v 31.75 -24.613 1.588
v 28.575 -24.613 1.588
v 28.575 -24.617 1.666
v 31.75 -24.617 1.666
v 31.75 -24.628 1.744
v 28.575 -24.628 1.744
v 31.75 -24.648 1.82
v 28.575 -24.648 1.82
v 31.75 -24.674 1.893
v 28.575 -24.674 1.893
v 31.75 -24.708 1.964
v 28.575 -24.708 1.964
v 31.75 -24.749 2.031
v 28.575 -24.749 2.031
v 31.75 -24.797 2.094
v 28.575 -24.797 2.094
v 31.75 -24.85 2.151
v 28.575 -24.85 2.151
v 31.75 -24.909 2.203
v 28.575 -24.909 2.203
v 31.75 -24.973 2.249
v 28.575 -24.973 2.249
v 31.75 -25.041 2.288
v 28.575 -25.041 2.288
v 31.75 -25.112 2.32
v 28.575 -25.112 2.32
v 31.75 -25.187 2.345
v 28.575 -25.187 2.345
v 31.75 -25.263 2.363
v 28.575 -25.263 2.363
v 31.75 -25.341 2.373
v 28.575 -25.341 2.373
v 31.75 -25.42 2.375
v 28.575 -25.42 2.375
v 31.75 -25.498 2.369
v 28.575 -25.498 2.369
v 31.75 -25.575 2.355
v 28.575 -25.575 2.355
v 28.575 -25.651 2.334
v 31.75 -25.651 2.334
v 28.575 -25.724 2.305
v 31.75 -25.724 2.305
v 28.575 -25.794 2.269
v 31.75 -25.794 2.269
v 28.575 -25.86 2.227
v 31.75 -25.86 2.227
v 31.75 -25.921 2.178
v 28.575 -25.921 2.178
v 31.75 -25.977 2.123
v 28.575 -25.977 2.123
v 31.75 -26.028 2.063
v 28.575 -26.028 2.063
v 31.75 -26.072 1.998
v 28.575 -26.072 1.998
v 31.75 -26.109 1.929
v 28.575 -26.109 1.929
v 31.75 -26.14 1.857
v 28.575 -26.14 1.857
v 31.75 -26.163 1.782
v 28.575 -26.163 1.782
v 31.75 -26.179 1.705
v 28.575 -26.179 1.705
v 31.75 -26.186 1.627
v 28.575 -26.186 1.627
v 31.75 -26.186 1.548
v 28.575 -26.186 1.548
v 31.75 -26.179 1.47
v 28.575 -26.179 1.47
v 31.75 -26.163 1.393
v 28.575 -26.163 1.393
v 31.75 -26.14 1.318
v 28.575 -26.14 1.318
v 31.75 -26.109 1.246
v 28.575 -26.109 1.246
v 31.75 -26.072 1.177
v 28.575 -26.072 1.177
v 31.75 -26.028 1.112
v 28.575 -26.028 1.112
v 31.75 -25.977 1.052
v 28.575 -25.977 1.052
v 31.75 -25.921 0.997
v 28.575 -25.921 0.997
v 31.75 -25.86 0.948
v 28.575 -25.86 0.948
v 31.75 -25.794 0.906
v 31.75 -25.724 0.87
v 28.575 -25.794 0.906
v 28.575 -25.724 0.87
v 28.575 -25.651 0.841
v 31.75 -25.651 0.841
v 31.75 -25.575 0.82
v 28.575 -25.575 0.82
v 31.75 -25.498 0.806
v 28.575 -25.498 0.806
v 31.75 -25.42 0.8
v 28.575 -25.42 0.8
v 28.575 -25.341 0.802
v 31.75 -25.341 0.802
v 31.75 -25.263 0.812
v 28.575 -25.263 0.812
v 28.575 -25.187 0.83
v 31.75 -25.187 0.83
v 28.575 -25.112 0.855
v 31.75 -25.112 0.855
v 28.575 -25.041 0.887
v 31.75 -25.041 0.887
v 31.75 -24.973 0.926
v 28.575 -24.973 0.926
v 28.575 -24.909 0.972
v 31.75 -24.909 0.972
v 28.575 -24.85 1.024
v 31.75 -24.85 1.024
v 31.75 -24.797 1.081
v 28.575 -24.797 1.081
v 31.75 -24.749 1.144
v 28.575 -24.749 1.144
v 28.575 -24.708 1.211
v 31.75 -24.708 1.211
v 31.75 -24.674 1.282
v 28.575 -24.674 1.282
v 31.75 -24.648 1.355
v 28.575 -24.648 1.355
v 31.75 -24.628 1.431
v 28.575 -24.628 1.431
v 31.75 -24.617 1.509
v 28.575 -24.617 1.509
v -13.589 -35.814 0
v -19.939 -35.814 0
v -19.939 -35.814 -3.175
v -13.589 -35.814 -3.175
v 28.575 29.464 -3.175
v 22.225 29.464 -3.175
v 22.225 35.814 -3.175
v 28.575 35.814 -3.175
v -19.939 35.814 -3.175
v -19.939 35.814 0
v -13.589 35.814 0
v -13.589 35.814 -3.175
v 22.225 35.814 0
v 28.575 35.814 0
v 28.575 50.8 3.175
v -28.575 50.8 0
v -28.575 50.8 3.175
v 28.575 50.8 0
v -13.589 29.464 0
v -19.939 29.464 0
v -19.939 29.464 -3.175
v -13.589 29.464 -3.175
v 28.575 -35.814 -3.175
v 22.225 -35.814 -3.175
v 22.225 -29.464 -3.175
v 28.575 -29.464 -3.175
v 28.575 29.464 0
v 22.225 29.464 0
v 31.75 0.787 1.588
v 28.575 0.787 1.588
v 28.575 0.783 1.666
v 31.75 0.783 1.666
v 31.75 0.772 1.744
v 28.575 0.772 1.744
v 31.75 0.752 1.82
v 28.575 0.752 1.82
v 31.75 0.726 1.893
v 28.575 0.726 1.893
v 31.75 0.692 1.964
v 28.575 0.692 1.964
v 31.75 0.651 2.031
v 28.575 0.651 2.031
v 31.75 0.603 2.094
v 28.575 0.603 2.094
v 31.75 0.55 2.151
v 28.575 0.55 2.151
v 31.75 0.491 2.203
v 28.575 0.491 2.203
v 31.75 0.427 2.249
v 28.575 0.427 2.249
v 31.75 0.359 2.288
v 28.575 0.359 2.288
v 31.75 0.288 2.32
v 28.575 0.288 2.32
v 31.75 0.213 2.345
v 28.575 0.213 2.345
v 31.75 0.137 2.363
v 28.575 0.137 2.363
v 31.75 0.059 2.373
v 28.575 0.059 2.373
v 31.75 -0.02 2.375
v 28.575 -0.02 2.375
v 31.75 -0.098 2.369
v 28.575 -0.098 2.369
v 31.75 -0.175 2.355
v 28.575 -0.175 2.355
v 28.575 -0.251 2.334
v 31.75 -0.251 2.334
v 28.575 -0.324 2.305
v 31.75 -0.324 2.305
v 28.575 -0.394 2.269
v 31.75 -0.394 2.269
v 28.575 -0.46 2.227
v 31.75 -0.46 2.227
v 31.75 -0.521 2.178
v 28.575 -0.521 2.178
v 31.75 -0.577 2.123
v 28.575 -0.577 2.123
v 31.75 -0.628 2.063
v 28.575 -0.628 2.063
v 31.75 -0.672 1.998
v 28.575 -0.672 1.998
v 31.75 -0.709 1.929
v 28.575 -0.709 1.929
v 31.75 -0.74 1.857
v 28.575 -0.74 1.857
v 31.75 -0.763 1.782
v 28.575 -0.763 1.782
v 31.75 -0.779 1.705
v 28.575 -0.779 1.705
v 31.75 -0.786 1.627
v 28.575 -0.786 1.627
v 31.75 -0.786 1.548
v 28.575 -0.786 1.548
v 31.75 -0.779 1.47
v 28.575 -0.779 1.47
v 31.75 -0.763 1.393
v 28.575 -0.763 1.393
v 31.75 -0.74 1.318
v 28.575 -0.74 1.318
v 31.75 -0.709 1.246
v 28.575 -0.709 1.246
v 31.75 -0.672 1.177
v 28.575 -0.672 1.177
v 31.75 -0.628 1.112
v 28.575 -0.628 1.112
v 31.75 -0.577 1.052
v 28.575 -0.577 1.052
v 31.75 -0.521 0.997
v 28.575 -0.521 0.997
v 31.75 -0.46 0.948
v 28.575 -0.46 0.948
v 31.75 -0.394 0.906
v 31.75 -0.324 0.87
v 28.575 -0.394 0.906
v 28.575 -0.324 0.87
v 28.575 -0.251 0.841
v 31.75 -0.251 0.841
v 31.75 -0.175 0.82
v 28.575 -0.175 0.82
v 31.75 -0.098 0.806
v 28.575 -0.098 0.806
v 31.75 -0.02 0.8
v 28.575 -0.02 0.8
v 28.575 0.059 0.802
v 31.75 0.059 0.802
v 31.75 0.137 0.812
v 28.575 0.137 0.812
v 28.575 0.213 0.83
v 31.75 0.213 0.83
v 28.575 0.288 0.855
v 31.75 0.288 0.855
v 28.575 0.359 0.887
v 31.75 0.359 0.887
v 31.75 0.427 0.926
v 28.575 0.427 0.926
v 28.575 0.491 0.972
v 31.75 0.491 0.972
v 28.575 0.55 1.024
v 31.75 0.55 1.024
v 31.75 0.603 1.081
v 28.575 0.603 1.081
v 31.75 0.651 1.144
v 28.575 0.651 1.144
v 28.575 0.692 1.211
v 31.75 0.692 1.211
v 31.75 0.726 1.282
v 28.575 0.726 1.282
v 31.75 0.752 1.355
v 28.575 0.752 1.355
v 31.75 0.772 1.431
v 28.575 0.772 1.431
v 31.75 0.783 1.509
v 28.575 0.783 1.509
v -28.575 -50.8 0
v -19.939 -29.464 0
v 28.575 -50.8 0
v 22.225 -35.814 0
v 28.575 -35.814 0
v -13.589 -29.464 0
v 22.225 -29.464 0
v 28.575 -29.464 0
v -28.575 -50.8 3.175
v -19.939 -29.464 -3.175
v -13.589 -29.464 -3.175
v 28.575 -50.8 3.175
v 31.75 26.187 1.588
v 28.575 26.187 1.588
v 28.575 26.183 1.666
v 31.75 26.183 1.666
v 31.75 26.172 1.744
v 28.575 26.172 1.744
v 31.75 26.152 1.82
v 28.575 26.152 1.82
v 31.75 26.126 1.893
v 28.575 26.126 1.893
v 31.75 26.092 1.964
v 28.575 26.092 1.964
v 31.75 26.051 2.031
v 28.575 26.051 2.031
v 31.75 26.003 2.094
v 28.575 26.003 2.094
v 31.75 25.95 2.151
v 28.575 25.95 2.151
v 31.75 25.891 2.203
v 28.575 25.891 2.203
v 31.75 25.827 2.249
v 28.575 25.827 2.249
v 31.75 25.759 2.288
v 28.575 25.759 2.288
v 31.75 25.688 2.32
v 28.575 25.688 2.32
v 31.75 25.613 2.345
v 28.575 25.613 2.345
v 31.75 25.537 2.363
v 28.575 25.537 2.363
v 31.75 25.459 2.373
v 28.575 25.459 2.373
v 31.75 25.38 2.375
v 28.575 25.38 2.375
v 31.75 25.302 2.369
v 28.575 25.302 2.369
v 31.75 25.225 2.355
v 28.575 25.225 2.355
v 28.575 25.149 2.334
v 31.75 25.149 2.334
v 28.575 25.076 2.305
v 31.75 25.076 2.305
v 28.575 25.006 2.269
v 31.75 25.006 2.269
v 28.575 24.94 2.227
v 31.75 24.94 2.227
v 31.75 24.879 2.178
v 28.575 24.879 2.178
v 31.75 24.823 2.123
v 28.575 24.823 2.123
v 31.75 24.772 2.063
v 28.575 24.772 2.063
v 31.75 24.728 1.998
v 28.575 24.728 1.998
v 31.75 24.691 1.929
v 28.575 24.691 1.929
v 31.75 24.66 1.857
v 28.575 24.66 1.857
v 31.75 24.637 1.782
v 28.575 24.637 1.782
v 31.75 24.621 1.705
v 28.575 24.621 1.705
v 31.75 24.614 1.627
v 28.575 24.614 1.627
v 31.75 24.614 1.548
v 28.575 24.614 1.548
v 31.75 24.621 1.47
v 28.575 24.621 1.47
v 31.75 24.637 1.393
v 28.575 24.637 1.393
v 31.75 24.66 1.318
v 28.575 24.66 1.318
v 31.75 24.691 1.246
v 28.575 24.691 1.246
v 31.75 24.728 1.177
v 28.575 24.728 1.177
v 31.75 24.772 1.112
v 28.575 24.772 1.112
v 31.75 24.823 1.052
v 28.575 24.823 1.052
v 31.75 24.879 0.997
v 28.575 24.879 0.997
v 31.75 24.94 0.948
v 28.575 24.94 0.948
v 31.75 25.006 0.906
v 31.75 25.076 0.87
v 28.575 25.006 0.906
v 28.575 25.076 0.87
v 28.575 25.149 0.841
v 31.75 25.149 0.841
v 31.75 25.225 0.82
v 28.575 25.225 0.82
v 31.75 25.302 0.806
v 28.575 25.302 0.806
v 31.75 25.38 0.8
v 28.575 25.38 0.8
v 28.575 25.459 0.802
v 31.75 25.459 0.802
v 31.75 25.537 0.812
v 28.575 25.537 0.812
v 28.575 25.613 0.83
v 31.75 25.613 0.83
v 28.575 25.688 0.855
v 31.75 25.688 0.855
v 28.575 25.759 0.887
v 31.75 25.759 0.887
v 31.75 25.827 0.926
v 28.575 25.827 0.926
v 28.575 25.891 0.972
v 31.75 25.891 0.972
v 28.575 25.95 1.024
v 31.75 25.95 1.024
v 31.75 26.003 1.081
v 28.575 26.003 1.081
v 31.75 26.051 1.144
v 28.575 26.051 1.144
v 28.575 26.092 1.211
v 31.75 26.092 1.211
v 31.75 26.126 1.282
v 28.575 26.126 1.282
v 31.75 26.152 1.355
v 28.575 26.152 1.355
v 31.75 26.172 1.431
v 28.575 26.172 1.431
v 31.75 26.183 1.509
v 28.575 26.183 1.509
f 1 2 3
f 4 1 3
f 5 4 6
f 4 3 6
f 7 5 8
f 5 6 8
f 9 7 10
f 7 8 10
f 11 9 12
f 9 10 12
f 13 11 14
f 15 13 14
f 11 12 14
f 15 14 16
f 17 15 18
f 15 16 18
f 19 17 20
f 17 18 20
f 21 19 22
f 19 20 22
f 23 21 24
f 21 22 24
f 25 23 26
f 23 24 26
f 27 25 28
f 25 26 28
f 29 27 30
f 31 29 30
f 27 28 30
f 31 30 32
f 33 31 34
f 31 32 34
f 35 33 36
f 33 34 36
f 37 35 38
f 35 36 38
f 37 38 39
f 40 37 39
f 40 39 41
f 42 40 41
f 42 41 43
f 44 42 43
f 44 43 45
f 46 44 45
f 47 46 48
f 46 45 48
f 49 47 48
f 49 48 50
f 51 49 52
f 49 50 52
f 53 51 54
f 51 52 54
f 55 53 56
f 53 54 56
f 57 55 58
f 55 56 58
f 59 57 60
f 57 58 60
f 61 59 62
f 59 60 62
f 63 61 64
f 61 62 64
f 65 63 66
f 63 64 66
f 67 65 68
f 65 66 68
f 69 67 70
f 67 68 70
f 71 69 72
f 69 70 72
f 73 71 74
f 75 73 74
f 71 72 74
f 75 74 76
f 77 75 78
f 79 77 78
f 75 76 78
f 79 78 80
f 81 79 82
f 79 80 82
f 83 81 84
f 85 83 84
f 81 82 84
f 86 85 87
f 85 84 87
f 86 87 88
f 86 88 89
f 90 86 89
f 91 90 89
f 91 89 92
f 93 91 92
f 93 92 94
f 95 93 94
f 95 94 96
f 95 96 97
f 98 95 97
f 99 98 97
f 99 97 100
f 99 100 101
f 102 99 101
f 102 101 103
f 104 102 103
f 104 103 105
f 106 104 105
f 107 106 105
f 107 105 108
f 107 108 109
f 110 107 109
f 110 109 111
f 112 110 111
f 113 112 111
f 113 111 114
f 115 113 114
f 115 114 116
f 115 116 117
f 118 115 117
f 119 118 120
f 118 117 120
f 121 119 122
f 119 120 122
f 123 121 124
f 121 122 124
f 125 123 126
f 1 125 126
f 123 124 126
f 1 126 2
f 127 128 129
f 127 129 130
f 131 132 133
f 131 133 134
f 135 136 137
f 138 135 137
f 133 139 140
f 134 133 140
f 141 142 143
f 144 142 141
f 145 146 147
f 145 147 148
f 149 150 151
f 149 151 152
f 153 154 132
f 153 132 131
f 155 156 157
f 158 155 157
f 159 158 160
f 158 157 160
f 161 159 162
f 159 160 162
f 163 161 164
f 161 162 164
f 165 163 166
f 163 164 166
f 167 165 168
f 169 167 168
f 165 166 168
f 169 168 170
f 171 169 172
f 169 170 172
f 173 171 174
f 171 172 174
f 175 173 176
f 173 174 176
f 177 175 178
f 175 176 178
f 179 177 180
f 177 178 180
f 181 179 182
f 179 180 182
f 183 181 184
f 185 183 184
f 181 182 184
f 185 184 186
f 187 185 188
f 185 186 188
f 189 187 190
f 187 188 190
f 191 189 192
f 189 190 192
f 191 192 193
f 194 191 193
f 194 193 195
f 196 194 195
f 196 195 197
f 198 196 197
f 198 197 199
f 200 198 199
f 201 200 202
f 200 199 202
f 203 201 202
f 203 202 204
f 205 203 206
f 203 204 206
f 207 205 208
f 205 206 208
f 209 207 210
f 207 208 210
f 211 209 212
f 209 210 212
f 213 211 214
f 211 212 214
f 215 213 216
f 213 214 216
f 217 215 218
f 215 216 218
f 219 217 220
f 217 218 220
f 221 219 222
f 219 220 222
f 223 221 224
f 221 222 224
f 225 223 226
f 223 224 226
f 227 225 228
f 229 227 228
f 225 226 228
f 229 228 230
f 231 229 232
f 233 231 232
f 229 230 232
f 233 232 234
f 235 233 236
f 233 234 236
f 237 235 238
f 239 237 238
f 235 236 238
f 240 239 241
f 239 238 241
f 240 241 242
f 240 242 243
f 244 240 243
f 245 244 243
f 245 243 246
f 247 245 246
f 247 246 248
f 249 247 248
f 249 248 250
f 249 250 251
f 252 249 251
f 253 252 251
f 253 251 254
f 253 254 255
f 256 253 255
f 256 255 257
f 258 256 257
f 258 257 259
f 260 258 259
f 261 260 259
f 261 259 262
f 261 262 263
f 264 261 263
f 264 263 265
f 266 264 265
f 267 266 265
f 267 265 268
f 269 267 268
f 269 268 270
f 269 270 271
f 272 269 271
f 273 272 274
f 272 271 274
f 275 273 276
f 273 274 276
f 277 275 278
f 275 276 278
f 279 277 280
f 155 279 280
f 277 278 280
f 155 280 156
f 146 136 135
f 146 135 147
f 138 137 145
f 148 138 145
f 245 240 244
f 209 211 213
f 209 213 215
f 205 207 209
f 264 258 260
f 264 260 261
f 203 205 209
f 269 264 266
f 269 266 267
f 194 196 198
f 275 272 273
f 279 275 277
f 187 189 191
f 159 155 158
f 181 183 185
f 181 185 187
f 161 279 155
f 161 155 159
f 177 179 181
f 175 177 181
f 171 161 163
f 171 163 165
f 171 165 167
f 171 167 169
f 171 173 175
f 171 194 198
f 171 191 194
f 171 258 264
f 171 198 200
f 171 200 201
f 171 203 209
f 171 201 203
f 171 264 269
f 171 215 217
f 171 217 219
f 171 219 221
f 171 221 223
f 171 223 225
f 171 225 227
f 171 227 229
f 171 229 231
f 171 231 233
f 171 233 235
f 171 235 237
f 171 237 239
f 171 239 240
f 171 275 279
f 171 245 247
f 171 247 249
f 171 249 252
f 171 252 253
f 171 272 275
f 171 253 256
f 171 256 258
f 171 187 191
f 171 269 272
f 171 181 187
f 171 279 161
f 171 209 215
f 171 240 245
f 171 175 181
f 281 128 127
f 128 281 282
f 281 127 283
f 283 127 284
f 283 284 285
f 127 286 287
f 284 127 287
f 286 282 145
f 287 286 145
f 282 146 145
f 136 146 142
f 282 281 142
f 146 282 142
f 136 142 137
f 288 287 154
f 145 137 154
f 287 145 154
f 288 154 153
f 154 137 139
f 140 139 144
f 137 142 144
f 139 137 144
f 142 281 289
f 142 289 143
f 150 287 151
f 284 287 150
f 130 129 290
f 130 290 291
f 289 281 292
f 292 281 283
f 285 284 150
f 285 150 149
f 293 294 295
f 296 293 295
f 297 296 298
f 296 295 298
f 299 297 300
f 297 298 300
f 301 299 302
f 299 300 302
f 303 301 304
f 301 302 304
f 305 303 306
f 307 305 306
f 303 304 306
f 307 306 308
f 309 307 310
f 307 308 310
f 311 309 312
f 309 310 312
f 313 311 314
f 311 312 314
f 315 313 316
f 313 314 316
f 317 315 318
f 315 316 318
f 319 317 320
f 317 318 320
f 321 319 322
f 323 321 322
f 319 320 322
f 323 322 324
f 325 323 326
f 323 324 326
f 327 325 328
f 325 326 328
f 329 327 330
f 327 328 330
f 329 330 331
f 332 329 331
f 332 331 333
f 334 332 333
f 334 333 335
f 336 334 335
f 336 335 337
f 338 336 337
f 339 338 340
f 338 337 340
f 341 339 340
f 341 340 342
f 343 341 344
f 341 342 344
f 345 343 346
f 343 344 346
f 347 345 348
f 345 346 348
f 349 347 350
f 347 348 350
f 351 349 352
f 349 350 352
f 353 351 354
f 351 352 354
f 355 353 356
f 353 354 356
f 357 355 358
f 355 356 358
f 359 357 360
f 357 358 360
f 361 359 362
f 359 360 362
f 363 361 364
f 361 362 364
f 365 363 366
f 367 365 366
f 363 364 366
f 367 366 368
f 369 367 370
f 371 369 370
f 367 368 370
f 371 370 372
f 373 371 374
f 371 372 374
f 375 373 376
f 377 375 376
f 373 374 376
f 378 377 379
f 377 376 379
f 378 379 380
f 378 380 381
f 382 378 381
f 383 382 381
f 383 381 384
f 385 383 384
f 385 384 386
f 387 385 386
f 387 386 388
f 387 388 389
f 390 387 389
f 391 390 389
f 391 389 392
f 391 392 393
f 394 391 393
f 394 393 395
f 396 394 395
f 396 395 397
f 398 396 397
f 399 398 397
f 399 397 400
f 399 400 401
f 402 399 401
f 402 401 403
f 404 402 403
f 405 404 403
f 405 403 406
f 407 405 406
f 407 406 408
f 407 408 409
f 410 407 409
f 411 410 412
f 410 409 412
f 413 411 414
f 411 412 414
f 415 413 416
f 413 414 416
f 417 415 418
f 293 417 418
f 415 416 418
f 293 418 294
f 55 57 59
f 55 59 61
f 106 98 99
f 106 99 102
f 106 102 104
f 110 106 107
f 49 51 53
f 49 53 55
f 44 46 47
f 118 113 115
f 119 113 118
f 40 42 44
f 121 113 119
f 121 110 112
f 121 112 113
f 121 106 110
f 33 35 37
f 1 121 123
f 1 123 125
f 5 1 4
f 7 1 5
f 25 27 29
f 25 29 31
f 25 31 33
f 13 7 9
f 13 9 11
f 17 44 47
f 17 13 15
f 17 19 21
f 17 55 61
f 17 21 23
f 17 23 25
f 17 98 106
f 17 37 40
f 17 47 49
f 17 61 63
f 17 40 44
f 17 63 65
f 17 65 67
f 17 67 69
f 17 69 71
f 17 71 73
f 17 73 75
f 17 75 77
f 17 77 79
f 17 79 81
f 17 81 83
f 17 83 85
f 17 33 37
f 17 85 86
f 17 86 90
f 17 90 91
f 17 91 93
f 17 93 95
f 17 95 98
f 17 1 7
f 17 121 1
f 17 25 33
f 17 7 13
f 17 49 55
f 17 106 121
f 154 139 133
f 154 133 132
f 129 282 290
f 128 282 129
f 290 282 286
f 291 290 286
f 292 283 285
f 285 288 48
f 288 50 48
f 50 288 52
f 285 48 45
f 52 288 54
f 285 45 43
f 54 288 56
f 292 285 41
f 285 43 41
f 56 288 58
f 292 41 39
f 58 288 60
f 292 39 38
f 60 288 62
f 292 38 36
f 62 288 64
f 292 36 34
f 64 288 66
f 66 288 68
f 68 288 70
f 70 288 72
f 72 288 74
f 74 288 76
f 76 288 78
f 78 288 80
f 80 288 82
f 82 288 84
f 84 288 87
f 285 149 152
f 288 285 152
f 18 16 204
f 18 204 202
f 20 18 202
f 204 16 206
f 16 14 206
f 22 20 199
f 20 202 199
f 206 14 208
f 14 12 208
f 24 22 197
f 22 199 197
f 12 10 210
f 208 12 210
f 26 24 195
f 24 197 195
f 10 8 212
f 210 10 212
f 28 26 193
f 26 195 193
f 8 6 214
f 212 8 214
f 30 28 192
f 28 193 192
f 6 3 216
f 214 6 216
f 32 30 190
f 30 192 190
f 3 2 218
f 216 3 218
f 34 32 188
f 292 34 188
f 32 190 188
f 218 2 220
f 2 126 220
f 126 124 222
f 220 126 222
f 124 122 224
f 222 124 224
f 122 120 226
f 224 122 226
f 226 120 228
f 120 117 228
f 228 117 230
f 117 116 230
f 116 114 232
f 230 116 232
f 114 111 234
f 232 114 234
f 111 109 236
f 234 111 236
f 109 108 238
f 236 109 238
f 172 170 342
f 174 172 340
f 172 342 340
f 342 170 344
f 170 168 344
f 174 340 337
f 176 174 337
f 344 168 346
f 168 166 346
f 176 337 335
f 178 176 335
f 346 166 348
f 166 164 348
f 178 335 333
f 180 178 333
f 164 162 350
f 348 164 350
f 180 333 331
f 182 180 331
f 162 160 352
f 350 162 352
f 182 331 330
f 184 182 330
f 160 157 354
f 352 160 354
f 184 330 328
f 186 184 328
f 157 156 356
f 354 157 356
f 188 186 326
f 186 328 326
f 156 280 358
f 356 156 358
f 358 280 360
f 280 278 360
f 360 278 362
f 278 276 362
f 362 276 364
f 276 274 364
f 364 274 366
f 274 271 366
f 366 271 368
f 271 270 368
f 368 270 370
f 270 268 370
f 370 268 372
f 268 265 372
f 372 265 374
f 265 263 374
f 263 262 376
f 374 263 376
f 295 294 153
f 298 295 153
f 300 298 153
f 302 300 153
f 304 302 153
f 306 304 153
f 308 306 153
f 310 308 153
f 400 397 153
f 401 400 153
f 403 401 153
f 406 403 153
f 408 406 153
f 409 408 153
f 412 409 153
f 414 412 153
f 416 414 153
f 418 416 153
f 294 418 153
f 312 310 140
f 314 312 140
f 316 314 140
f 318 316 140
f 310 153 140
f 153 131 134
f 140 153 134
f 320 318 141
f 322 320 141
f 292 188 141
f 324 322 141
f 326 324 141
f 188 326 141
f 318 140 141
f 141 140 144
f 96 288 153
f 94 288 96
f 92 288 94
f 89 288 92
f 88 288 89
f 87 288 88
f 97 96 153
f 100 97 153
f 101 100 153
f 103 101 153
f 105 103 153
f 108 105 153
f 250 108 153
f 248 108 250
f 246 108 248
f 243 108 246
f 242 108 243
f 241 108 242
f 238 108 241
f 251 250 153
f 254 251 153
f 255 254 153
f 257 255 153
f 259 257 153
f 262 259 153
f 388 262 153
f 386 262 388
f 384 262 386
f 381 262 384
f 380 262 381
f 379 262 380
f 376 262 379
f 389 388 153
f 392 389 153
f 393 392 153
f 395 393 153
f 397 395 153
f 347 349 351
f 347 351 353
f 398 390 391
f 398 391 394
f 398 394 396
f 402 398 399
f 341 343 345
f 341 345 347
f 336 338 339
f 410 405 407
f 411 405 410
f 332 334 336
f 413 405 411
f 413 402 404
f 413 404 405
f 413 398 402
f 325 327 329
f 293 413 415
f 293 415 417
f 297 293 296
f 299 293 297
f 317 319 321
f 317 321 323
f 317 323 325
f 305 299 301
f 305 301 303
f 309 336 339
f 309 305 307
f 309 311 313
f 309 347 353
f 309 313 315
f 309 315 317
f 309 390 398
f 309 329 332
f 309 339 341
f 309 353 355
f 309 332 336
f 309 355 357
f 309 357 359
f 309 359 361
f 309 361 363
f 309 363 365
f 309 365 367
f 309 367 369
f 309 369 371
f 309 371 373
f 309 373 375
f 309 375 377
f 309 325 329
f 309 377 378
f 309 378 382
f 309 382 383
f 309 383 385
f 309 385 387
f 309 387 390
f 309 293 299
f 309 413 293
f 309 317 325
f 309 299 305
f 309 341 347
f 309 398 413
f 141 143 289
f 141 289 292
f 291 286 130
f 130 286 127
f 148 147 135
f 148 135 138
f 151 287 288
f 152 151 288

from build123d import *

# Parameters (mm, degrees)
F0_W     = 57.15
F0_H     = 101.6
F1_DEPTH = 3.175
F2_R     = 0.7874
F3_DEPTH = 3.175
F4_W     = 6.35
F4_H     = 6.35
F5_DEPTH = 3.175


with BuildPart() as f1:
    # F0 (on Top) → F1 (new body)
    with BuildSketch(Plane.XY):
        Rectangle(F0_W, F0_H)
    extrude(amount=F1_DEPTH)

    # F2 (on face) → F3 (join)
    with BuildSketch(Plane.YZ.offset(28.575)):
        with Locations((0, 1.5875)):
            Circle(F2_R)
        with Locations((25.4, 1.5875)):
            Circle(F2_R)
        with Locations((-25.4, 1.5875)):
            Circle(F2_R)
    extrude(amount=F3_DEPTH)

    # F4 (on face) → F5 (join)
    with BuildSketch(Plane(origin=(0, 0, 0), x_dir=(1, 0, 0), z_dir=(0, 0, -1))):
        with Locations((-16.764, 32.639)):
            Rectangle(F4_W, F4_H)
        with Locations((-16.764, -32.639)):
            Rectangle(F4_W, F4_H)
        with Locations((25.4, -32.639)):
            Rectangle(F4_W, F4_H)
        with Locations((25.4, 32.639)):
            Rectangle(F4_W, F4_H)
    extrude(amount=F5_DEPTH)


solid = f1.part
